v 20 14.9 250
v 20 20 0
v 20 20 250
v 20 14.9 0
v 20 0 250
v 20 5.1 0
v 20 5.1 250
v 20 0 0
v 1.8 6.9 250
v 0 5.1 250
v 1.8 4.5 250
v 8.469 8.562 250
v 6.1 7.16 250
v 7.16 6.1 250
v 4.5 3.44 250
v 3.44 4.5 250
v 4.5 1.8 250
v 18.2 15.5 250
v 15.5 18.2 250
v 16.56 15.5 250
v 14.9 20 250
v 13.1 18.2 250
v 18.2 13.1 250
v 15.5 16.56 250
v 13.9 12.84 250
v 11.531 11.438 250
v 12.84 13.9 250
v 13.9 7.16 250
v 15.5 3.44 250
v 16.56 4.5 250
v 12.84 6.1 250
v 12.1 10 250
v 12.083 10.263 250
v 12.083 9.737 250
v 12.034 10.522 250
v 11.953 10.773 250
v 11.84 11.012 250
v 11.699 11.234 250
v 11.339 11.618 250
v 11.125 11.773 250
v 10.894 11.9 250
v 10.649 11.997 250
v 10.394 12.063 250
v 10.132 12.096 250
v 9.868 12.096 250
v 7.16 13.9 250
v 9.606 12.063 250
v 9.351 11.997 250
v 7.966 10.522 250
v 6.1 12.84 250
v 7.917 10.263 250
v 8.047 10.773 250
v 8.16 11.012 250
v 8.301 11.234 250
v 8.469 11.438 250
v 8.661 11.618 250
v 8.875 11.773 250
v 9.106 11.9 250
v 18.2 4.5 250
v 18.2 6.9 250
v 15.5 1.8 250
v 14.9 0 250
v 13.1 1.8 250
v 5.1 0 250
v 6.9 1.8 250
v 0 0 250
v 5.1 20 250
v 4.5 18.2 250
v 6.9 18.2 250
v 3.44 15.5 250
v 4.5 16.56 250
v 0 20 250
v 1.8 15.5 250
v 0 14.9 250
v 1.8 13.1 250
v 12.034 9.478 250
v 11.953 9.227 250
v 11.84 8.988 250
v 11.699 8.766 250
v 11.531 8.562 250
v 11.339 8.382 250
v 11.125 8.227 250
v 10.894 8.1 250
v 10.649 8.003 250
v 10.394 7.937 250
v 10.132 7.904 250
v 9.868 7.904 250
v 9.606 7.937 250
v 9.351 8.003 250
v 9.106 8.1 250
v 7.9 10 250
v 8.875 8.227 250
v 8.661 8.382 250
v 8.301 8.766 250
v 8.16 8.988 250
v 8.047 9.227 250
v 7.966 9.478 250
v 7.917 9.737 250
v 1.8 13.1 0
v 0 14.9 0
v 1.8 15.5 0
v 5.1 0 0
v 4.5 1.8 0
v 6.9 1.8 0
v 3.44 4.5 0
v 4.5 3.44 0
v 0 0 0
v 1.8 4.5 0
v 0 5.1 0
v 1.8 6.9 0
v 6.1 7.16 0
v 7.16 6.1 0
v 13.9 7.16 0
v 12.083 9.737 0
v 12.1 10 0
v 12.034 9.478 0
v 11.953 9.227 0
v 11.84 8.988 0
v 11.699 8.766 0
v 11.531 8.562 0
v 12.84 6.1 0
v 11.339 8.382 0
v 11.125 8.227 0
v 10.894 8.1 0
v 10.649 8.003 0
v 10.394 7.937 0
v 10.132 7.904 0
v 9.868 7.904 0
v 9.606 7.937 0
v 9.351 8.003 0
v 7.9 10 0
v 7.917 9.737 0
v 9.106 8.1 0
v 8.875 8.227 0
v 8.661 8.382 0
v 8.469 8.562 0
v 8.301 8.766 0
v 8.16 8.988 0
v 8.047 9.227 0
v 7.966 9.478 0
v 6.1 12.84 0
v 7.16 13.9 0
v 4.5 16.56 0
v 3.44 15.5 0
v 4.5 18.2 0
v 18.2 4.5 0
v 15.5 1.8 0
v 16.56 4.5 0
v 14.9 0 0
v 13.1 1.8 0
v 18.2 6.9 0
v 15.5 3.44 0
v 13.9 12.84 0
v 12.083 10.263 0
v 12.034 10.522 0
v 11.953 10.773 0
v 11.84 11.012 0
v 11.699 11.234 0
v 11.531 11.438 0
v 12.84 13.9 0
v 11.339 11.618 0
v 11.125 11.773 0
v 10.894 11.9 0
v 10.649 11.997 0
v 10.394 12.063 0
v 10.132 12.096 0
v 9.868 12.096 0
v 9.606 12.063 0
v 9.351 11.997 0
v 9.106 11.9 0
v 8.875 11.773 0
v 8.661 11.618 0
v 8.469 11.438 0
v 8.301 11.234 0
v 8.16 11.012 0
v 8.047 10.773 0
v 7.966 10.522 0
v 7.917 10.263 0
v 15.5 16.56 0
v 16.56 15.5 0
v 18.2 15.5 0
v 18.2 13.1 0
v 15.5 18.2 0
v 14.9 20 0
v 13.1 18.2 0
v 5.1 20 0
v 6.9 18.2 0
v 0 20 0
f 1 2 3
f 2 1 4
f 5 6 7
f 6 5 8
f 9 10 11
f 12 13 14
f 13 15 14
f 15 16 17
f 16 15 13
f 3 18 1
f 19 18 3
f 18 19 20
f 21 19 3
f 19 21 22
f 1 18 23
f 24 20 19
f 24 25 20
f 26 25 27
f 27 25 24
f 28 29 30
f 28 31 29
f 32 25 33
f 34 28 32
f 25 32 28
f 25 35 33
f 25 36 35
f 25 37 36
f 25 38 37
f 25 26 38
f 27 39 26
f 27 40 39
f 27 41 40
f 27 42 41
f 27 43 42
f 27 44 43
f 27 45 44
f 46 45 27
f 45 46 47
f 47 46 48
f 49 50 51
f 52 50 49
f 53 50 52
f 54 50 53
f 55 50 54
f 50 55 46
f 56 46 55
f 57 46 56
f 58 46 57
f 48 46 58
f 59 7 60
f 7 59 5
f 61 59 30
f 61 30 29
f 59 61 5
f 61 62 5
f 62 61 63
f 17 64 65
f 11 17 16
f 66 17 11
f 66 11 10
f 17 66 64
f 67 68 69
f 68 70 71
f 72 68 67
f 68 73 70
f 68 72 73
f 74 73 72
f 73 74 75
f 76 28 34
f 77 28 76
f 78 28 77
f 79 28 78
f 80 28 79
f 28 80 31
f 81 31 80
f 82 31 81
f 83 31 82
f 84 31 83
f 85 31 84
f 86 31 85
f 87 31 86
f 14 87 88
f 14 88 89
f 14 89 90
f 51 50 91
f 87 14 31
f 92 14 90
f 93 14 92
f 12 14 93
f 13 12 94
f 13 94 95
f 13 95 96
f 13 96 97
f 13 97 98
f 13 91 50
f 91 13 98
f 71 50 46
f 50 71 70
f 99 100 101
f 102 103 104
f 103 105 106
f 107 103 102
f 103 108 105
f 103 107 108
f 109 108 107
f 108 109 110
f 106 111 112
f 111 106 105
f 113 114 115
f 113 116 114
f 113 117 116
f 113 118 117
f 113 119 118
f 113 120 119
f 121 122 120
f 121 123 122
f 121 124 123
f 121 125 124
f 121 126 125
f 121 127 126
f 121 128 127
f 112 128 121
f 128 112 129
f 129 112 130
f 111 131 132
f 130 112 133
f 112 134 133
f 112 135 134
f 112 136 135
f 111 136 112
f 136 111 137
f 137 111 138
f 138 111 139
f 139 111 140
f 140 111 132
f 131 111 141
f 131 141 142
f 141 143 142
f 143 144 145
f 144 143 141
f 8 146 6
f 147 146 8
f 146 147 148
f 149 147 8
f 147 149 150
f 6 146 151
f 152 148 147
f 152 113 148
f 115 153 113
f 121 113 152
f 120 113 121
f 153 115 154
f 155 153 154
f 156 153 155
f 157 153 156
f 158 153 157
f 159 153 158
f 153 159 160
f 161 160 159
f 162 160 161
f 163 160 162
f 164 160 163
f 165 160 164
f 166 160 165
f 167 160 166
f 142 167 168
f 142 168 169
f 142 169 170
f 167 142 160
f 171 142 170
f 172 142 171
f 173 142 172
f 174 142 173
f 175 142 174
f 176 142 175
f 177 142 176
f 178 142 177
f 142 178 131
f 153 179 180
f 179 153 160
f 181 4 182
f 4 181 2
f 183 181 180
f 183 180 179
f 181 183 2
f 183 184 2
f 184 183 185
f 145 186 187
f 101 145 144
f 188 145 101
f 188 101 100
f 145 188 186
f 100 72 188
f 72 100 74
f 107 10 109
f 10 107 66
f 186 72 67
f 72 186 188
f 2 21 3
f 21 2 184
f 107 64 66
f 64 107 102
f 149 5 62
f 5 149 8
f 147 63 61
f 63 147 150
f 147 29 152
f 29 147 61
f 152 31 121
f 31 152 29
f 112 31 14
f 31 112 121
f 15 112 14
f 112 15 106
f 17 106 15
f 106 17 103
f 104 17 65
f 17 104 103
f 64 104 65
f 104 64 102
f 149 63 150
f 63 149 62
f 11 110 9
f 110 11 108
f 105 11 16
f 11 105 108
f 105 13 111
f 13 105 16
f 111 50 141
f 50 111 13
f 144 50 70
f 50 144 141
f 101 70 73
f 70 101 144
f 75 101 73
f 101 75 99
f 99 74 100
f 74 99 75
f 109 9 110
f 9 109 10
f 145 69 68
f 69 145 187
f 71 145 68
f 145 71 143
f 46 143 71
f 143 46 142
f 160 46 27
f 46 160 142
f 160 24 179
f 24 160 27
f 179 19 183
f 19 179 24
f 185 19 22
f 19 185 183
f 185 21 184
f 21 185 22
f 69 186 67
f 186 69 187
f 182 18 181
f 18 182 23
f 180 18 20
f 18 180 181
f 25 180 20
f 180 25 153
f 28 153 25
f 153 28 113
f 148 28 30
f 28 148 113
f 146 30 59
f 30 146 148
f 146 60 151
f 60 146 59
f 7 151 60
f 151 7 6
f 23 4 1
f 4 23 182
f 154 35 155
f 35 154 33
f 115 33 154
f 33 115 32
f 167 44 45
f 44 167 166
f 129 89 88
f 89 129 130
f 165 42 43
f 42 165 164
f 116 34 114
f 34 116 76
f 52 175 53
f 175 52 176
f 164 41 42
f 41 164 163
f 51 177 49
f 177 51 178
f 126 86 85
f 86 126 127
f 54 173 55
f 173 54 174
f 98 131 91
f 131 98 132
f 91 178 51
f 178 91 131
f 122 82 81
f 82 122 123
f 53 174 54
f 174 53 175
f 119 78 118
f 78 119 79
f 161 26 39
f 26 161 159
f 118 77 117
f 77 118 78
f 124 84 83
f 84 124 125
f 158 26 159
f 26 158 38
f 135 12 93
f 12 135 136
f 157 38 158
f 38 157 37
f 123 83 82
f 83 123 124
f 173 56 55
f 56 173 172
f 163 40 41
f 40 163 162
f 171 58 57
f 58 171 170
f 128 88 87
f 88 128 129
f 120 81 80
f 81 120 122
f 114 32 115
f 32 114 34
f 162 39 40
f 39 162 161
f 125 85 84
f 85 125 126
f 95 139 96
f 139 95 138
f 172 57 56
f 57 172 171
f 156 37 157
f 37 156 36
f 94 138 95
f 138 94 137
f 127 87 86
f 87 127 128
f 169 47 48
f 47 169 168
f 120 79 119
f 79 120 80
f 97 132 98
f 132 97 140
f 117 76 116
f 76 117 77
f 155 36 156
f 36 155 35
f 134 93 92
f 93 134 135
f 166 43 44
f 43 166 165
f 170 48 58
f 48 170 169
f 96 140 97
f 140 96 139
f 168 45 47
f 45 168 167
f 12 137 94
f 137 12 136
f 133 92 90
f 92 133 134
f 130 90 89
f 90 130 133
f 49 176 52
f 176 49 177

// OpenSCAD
// Generated by SolidPython 1.1.3 on 2022-04-28 23:56:22


difference() {
	cube(size = [20.0000000000, 20.0000000000, 250]);
	translate(v = [5.1000000000, 0, 0]) {
		linear_extrude(center = false, convexity = 10, height = 250, twist = 0) {
			polygon(points = [[0.0000000000, 0.0000000000], [1.8000000000, 1.8000000000], [-0.6000000000, 1.8000000000], [-0.6000000000, 3.4400000000], [2.0600000000, 6.1000000000], [7.7400000000, 6.1000000000], [10.4000000000, 3.4400000000], [10.4000000000, 1.8000000000], [8, 1.8000000000], [9.8000000000, 0.0000000000], [0.0000000000, 0.0000000000]]);
		}
	}
	translate(v = [0, 14.9000000000, 0]) {
		rotate(a = [0, 0, 270]) {
			linear_extrude(center = false, convexity = 10, height = 250, twist = 0) {
				polygon(points = [[0.0000000000, 0.0000000000], [1.8000000000, 1.8000000000], [-0.6000000000, 1.8000000000], [-0.6000000000, 3.4400000000], [2.0600000000, 6.1000000000], [7.7400000000, 6.1000000000], [10.4000000000, 3.4400000000], [10.4000000000, 1.8000000000], [8, 1.8000000000], [9.8000000000, 0.0000000000], [0.0000000000, 0.0000000000]]);
			}
		}
	}
	translate(v = [14.9000000000, 0, 0]) {
		translate(v = [0, 20.0000000000, 0]) {
			rotate(a = [0, 0, 180]) {
				linear_extrude(center = false, convexity = 10, height = 250, twist = 0) {
					polygon(points = [[0.0000000000, 0.0000000000], [1.8000000000, 1.8000000000], [-0.6000000000, 1.8000000000], [-0.6000000000, 3.4400000000], [2.0600000000, 6.1000000000], [7.7400000000, 6.1000000000], [10.4000000000, 3.4400000000], [10.4000000000, 1.8000000000], [8, 1.8000000000], [9.8000000000, 0.0000000000], [0.0000000000, 0.0000000000]]);
				}
			}
		}
	}
	translate(v = [20.0000000000, 0, 0]) {
		translate(v = [0, 5.1000000000, 0]) {
			rotate(a = [0, 0, 90]) {
				linear_extrude(center = false, convexity = 10, height = 250, twist = 0) {
					polygon(points = [[0.0000000000, 0.0000000000], [1.8000000000, 1.8000000000], [-0.6000000000, 1.8000000000], [-0.6000000000, 3.4400000000], [2.0600000000, 6.1000000000], [7.7400000000, 6.1000000000], [10.4000000000, 3.4400000000], [10.4000000000, 1.8000000000], [8, 1.8000000000], [9.8000000000, 0.0000000000], [0.0000000000, 0.0000000000]]);
				}
			}
		}
	}
	translate(v = [0, 10.0000000000, 0]) {
		translate(v = [10.0000000000, 0, 0]) {
			cylinder($fn = 50, h = 250, r = 2.1000000000);
		}
	}
}
/***********************************************
*********      SolidPython code:      **********
************************************************
 
from solid import *
from solid.utils import *  # Not required, but the utils module is useful

GROOVE_WIDTH = 9.8

def make_groove(height):
    # Define the shape of the vslot grooves as a polygon.
    groove_points = [
        [0.0, 0.0, 0.0],
        [1.8, 1.8, 0.0],
        [-0.6, 1.8, 0.0],
        [-0.6, 3.44, 0.0],
        [2.06, 6.1, 0.0],
        [7.74, 6.1, 0.0],
        [10.4, 3.44, 0.0],
        [10.4, 1.8, 0.0],
        [8, 1.8, 0.0],
        [9.8, 0.0, 0.0],
        [0.0, 0.0, 0.0],
    ];

    # Extrude the groove polygon into a 3d object.
    return linear_extrude(height = height, center = False, convexity = 10, twist = 0)(
        polygon(groove_points)
    );

def make_2020(height):
    # Overall dimensions
    side = 20.0;

    translate_dist = (side/2) - (GROOVE_WIDTH/2);

    bottom_groove = right(translate_dist)(
        make_groove(height)
    );

    left_groove = forward(translate_dist + GROOVE_WIDTH)(
        rotate([0, 0, 270])(
            make_groove(height)
        )
    );

    top_groove = right(translate_dist + GROOVE_WIDTH)(
        forward(side)(
            rotate([0, 0, 180])(
                make_groove(height)
            )
        )
    );
    
    right_groove = right(side)(
        forward(translate_dist)(
            rotate([0, 0, 90])(
                make_groove(height)
            )
        )
    );

    center_hole = forward(side/2)(
        right(side/2)(
            cylinder(h=height, r=2.1, segments=50)
        )
    );

    return cube([side, side, height]) - bottom_groove - left_groove - top_groove - right_groove - center_hole;

# Test renders
scad_render_to_file(make_2020(250), '../../scad/vslot2020_250mm.scad');
scad_render_to_file(make_2020(500), '../../scad/vslot2020_500mm.scad');
scad_render_to_file(make_2020(1000), '../../scad/vslot2020_1000mm.scad');
scad_render_to_file(make_2020(1500), '../../scad/vslot2020_1500mm.scad');
scad_render_to_file(make_2020(2000), '../../scad/vslot2020_2000mm.scad');
scad_render_to_file(make_groove(250), '../../scad/vslotgroove.scad'); 
 
************************************************/
